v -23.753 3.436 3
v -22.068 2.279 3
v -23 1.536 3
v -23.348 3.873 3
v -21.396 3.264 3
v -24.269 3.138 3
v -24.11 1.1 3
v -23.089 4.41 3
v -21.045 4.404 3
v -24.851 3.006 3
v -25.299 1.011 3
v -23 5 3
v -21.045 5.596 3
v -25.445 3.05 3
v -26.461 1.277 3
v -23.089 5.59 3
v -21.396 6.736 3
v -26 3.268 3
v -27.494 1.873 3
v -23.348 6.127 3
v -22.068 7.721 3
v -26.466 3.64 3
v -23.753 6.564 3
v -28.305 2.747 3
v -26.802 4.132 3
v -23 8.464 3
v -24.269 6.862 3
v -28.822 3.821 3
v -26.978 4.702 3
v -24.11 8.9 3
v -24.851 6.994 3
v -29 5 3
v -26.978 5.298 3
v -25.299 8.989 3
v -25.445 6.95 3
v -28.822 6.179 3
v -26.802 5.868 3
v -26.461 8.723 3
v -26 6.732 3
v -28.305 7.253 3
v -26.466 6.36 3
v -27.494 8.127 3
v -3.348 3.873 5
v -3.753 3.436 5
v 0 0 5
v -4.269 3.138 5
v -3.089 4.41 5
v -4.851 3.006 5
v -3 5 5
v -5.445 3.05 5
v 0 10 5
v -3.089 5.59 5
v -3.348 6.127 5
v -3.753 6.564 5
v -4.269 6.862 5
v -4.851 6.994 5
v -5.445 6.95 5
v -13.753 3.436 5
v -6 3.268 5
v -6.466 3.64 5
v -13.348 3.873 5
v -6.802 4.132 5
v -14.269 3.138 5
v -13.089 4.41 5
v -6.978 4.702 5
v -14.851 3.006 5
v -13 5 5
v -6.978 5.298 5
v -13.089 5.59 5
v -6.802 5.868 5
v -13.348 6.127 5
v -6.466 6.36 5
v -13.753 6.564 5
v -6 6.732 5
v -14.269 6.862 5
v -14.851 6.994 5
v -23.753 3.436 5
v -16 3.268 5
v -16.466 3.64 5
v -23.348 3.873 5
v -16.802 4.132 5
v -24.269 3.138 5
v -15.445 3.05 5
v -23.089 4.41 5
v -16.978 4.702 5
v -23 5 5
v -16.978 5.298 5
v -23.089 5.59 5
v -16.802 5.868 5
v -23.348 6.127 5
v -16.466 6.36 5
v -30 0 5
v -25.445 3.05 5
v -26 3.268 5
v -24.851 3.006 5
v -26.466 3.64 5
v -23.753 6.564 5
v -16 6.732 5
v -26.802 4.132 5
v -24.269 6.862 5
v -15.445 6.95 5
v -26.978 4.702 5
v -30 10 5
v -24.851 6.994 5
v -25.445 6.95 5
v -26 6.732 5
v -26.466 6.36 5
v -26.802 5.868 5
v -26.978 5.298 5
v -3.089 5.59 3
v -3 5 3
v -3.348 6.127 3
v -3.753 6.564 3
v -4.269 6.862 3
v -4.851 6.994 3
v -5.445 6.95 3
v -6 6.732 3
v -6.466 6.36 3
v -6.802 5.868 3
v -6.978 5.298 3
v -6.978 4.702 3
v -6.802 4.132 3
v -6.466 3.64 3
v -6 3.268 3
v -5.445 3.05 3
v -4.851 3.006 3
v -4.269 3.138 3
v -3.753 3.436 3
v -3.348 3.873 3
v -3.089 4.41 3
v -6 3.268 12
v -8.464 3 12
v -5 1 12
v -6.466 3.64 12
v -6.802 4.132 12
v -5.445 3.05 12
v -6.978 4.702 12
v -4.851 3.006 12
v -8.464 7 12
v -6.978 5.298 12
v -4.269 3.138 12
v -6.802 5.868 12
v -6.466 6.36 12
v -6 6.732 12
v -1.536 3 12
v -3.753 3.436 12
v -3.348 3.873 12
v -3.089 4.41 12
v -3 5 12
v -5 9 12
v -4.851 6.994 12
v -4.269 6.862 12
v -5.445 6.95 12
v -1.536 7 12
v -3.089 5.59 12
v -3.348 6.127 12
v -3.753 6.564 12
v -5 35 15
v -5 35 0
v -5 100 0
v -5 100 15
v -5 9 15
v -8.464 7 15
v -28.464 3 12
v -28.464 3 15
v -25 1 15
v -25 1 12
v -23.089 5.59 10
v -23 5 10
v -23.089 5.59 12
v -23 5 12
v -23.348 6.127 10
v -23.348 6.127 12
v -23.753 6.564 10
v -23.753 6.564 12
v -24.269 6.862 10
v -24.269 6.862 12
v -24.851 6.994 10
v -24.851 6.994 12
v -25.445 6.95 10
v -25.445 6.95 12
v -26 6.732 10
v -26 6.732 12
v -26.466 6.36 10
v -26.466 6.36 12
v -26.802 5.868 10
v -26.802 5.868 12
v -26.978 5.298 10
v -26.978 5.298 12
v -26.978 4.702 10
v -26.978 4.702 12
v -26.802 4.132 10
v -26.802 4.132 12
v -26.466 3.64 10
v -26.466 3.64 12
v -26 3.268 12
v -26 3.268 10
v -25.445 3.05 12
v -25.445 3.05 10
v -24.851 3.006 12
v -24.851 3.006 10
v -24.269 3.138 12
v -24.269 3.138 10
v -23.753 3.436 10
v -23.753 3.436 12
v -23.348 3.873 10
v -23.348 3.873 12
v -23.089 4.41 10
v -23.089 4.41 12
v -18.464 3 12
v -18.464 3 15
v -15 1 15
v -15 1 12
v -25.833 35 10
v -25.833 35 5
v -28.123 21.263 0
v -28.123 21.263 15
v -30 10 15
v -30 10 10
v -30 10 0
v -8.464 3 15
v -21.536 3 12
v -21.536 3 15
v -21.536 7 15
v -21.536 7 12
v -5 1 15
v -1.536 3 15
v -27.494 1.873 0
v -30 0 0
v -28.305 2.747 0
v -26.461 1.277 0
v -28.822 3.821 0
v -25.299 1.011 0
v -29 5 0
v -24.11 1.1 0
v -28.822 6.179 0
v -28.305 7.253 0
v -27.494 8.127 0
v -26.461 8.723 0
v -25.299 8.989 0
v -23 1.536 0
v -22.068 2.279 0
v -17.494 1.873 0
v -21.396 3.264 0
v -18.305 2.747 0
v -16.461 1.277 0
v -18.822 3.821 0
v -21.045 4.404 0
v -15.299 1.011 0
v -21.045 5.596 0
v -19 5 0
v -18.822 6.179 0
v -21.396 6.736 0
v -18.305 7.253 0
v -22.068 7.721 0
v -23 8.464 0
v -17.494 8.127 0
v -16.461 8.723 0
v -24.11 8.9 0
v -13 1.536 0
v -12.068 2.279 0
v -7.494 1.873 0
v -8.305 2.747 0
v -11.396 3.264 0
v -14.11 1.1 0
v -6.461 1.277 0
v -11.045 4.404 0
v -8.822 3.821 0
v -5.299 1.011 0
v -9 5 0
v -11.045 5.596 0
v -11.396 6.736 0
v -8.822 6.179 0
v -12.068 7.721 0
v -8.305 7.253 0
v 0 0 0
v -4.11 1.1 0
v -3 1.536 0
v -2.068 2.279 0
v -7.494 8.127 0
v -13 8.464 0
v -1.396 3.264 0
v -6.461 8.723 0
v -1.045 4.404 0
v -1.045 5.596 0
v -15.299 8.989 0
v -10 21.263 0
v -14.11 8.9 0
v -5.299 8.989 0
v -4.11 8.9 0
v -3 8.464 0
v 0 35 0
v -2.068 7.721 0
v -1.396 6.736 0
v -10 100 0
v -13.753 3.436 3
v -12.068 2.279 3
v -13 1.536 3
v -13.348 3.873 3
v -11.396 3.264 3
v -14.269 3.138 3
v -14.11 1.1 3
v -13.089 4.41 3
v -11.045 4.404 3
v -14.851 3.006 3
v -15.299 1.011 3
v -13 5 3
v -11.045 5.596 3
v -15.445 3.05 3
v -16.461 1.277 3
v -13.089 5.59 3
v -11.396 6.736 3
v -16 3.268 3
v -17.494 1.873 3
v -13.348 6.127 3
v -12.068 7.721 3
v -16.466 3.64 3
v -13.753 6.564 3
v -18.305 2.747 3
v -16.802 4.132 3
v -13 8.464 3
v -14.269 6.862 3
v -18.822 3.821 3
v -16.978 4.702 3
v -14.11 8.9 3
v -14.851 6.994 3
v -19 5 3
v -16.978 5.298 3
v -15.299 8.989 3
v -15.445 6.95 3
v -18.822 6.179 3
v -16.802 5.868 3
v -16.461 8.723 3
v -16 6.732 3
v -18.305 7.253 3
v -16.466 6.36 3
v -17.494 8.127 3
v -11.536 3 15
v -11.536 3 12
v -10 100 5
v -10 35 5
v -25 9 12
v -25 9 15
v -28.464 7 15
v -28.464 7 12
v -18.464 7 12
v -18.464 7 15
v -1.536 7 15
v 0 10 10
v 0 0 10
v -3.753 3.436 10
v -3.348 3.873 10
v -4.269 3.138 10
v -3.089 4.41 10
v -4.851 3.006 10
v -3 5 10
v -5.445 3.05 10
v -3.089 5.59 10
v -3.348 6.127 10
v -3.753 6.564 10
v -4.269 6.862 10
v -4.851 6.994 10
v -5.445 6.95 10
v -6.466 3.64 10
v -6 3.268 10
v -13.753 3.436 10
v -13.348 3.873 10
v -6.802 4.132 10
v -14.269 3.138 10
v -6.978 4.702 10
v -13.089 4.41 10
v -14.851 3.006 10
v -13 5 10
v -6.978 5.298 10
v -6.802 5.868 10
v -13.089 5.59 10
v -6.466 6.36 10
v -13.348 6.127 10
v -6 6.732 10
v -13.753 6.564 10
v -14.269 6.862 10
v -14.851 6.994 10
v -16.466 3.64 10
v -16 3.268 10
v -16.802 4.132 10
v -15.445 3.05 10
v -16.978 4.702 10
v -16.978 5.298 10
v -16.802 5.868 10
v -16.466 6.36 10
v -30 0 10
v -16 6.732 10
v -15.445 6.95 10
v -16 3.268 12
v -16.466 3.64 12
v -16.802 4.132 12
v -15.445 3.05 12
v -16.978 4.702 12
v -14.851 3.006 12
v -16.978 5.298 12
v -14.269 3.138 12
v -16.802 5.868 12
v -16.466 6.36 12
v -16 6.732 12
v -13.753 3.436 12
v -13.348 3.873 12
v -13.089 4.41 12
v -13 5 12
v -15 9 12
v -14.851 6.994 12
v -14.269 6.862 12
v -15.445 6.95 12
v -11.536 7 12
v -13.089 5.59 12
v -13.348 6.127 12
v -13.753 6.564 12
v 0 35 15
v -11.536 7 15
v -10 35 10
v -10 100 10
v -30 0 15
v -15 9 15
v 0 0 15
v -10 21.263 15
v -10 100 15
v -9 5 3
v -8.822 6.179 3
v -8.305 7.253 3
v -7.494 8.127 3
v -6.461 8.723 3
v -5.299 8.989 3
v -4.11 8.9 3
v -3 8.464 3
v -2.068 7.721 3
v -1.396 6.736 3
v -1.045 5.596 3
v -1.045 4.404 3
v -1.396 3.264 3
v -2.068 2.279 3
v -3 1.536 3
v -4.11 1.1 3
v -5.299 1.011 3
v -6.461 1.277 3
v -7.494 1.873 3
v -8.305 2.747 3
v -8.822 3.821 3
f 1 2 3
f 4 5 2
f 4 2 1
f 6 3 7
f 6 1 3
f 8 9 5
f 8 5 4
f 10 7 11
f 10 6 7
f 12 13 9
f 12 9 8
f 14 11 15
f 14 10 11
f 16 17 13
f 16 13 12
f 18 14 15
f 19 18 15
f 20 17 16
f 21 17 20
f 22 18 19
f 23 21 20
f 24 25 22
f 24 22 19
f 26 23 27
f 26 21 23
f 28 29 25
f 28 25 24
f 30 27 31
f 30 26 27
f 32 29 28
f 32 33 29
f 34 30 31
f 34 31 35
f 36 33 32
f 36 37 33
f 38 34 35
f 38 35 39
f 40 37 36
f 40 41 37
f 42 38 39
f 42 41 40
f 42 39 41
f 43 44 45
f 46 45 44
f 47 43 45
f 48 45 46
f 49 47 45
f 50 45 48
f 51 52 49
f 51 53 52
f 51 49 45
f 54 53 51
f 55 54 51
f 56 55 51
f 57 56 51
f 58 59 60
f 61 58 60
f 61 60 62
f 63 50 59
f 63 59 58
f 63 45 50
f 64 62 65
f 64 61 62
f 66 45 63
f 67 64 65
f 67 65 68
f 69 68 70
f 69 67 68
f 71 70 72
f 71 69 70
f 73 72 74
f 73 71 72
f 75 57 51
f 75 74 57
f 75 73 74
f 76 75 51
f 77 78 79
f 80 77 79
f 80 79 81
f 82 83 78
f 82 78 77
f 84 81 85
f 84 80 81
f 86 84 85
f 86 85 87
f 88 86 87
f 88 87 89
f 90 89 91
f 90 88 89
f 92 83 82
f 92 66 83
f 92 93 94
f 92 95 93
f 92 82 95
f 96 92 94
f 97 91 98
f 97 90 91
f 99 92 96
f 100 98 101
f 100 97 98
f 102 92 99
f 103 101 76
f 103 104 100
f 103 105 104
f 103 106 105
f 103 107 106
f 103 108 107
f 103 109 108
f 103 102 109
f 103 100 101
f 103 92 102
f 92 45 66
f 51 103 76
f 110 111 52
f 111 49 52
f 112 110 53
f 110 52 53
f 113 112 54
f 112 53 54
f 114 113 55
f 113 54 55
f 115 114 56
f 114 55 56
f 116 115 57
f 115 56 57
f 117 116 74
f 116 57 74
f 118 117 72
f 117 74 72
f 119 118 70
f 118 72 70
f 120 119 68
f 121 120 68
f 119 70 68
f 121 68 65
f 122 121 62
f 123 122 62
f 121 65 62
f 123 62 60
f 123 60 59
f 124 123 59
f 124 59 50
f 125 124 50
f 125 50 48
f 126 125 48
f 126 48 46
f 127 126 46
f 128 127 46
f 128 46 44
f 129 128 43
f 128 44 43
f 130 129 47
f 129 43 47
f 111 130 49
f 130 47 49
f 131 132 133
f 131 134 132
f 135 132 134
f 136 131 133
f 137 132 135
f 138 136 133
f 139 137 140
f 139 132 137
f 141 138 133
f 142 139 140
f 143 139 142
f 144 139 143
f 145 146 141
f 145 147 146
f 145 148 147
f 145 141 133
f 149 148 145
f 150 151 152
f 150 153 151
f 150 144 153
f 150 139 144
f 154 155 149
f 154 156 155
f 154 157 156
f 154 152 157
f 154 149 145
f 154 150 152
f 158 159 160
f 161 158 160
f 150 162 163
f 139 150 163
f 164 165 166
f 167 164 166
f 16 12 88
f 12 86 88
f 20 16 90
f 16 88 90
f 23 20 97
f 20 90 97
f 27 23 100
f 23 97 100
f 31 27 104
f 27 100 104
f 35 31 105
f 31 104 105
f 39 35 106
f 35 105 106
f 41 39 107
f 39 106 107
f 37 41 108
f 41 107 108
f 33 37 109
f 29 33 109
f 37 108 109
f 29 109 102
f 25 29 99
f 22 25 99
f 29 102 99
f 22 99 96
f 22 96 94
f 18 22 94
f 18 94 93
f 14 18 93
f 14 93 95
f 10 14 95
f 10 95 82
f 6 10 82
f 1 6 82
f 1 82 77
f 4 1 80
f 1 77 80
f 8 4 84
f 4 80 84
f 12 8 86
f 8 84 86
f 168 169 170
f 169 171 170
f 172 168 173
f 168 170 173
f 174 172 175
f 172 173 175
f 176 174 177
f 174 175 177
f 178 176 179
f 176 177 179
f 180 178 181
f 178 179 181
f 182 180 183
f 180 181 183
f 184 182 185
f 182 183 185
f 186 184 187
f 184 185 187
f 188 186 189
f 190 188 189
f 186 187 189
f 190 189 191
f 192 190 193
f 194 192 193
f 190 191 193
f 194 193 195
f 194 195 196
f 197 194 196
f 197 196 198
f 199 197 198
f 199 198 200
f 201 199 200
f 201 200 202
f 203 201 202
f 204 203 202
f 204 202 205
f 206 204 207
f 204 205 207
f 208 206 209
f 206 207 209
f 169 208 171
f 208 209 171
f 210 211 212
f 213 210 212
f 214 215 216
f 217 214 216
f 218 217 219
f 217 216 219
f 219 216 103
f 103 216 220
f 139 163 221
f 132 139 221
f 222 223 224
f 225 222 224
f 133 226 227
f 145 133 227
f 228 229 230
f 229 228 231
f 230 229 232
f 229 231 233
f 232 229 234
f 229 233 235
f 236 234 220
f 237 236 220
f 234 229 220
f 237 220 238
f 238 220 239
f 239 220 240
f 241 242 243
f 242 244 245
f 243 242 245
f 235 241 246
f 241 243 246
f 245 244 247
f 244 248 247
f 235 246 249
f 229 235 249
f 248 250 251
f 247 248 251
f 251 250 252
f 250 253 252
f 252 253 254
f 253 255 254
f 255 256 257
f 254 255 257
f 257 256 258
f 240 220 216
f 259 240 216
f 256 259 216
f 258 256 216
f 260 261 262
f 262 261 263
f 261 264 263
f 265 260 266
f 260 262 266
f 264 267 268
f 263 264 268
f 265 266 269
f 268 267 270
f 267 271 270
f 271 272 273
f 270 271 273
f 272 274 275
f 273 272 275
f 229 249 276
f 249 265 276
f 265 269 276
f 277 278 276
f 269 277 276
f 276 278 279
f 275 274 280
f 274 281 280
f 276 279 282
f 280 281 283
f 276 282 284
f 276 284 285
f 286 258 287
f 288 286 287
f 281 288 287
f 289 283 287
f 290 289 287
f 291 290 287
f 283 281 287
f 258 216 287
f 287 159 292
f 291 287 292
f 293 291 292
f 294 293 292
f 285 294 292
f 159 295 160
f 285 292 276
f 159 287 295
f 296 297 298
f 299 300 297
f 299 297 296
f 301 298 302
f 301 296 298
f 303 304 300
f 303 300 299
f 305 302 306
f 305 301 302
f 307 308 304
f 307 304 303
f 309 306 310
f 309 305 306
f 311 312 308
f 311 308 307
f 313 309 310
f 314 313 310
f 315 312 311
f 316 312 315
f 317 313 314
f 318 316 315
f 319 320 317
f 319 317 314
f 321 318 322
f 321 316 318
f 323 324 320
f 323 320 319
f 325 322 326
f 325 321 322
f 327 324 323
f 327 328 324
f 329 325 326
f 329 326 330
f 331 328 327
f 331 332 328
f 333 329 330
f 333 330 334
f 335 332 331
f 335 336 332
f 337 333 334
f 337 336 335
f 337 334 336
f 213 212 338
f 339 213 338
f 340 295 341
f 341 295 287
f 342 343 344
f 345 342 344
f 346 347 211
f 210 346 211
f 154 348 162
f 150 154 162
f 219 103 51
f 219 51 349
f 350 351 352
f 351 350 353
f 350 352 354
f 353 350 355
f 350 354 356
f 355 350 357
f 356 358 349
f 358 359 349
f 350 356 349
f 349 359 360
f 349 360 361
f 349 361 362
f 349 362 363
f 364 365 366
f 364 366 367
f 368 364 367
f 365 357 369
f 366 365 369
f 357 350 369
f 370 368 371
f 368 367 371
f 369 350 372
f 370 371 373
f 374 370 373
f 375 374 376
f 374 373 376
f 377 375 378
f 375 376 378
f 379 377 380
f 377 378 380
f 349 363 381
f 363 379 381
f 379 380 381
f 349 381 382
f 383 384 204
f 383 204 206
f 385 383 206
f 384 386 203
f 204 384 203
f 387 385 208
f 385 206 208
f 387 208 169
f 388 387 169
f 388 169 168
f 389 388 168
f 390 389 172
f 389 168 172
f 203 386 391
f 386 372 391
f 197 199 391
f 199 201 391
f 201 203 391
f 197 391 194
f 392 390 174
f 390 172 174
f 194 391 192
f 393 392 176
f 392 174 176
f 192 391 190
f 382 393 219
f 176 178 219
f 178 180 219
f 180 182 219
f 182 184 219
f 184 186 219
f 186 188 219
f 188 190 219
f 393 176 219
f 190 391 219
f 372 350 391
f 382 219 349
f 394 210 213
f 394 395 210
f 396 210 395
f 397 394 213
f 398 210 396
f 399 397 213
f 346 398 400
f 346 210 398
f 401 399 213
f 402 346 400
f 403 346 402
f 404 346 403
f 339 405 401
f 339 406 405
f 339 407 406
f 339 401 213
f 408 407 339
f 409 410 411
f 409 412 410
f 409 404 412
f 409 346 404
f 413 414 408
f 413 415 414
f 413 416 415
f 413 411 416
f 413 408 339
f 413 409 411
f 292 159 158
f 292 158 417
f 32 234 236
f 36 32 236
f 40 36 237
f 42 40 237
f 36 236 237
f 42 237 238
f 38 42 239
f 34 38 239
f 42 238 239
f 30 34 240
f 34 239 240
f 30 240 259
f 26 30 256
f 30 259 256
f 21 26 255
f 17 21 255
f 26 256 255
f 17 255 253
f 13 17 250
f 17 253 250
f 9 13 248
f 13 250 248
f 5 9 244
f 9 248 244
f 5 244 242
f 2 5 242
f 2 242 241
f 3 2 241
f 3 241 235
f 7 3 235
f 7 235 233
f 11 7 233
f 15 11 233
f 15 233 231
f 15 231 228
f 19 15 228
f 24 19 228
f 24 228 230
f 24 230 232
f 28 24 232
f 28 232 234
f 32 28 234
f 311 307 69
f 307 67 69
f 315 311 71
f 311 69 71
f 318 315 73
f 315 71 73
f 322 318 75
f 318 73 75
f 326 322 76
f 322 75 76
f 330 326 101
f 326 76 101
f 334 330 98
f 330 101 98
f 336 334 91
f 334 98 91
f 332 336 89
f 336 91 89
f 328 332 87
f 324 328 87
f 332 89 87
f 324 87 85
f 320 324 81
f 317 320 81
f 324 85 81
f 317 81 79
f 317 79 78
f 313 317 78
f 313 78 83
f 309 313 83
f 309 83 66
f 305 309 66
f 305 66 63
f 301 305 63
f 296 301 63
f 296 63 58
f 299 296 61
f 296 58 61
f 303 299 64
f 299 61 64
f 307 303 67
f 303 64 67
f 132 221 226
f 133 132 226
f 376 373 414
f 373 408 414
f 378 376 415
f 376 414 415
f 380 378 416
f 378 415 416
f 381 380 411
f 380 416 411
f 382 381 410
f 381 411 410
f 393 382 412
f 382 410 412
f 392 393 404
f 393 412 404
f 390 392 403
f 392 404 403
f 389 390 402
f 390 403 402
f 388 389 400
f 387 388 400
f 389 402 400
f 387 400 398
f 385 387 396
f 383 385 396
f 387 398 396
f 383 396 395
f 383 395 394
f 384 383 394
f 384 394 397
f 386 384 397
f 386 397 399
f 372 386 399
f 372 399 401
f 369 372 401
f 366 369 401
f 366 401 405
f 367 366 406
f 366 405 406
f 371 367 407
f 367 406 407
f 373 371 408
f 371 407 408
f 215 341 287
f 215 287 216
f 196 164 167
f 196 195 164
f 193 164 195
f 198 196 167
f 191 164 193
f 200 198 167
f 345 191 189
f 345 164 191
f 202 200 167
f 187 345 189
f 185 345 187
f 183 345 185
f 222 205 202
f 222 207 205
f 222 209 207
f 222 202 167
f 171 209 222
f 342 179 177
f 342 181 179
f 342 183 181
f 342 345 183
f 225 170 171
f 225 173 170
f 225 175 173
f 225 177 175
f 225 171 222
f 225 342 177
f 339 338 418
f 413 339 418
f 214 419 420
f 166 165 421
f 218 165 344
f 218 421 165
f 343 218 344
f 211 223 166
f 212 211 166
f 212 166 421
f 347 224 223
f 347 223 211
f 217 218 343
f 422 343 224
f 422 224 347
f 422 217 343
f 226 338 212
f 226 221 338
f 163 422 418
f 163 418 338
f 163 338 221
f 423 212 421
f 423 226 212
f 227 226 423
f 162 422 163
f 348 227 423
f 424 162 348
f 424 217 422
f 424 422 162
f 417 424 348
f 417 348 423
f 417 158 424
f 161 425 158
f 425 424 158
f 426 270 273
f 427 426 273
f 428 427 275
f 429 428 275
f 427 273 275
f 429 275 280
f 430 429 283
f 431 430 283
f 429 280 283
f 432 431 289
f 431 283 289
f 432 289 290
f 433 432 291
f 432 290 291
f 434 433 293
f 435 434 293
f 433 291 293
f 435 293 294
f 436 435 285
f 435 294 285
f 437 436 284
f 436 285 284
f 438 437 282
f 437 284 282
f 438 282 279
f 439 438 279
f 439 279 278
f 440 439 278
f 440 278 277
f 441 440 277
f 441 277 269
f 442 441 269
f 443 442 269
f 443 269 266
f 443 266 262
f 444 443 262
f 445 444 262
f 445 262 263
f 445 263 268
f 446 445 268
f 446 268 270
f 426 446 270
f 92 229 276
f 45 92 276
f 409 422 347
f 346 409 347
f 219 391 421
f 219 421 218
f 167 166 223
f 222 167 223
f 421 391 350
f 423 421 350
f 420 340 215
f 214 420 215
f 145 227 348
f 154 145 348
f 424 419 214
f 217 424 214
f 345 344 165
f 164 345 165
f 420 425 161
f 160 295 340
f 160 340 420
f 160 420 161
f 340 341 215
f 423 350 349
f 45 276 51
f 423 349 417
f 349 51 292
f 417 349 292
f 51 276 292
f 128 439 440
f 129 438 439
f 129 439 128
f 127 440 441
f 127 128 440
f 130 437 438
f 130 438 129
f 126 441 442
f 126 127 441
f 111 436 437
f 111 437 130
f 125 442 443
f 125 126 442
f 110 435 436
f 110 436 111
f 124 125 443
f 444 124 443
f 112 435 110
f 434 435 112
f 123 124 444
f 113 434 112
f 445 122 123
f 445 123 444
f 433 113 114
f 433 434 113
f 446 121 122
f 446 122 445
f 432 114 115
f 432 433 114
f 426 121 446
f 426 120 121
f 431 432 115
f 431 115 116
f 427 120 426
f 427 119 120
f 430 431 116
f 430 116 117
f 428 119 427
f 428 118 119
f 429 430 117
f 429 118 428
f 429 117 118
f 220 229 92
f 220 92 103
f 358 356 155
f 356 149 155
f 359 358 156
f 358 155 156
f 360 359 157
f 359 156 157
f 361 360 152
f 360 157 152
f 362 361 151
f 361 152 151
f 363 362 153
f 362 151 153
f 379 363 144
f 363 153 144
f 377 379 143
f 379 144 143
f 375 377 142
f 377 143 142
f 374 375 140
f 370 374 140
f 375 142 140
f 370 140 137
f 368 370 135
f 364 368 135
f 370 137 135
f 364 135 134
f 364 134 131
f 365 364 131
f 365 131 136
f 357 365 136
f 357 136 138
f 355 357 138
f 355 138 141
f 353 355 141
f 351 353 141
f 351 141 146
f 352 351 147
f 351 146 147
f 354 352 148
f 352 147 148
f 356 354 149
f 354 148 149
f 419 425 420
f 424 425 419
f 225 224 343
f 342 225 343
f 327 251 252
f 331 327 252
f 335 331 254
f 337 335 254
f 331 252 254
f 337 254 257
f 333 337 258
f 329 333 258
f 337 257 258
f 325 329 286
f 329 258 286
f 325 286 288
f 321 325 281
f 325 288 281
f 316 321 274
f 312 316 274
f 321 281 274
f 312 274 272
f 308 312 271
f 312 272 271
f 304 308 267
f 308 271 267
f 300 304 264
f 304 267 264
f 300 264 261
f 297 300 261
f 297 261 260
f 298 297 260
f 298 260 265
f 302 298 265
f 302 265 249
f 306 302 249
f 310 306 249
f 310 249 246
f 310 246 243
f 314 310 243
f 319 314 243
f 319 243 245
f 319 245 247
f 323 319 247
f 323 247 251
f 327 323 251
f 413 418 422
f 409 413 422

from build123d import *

# Parameters (mm, degrees)
SKETCH1_W                                        = 10
SKETCH1_H                                        = 65
SKETCH1_H_2                                      = 25
SKETCH1_W_2                                      = 5
SKETCH1_H_3                                      = 10
SKETCH1_W_3                                      = 15
BOSS_EXTRUDE1_DEPTH                              = 15
CBORE_FOR_M4_HEX_HEAD_MACHINE_SCREW1_D           = 4
CBORE_FOR_M4_HEX_HEAD_MACHINE_SCREW1_CBORE_D     = 8
CBORE_FOR_M4_HEX_HEAD_MACHINE_SCREW1_CBORE_DEPTH = 3
CUT_EXTRUDE1_DEPTH                               = 3
SKETCH7_W                                        = 5
SKETCH7_H                                        = 10
CUT_EXTRUDE2_DEPTH                               = 106.475115549
CUT_EXTRUDE3_DEPTH                               = 106.475115549
CUT_EXTRUDE4_DEPTH                               = 5
CUT_EXTRUDE5_DEPTH                               = 5
CHAMFER1_SIZE2                                   = 5
CHAMFER1_SIZE                                    = 13.737387097
CHAMFER2_SIZE2                                   = 5
CHAMFER2_SIZE                                    = 13.737387097


with BuildPart() as part:
    # Sketch1 → Boss-Extrude1 (new body)
    with BuildSketch(Plane.XY):
        Polygon((-30, 10), (-15, 10), (-15, 35), (-15, 100), align=None)
        with Locations((-10, 67.5)):
            Rectangle(SKETCH1_W, SKETCH1_H)
        with Locations((-10, 22.5)):
            Rectangle(SKETCH1_W, SKETCH1_H_2)
        with Locations((-2.5, 22.5)):
            Rectangle(SKETCH1_W_2, SKETCH1_H_2)
        with Locations((-2.5, 5)):
            Rectangle(SKETCH1_W_2, SKETCH1_H_3)
        with Locations((-10, 5)):
            Rectangle(SKETCH1_W, SKETCH1_H_3)
        with Locations((-22.5, 5)):
            Rectangle(SKETCH1_W_3, SKETCH1_H_3)
    extrude(amount=BOSS_EXTRUDE1_DEPTH)

    # CBORE for M4 Hex Head Machine Screw1 (through all)
    with Locations(Plane(origin=(0, 0, 0), x_dir=(-1, 0, 0), z_dir=(0, 0, -1))):
        with Locations((25, 5), (15, 5), (5, 5)):
            CounterBoreHole(CBORE_FOR_M4_HEX_HEAD_MACHINE_SCREW1_D / 2, CBORE_FOR_M4_HEX_HEAD_MACHINE_SCREW1_CBORE_D / 2, CBORE_FOR_M4_HEX_HEAD_MACHINE_SCREW1_CBORE_DEPTH)

    # Sketch6 → Cut-Extrude1 (cut)
    with BuildSketch(Plane.XY.offset(15)):
        Polygon((-15, 9), (-18.464101615, 7), (-18.464101615, 3), (-15, 1), (-11.535898385, 3), (-11.535898385, 7), align=None)
        Polygon((-25, 9), (-28.464101615, 7), (-28.464101615, 3), (-25, 1), (-21.535898385, 3), (-21.535898385, 7), align=None)
        Polygon((-5, 9), (-8.464101615, 7), (-8.464101615, 3), (-5, 1), (-1.535898385, 3), (-1.535898385, 7), align=None)
    extrude(amount=-CUT_EXTRUDE1_DEPTH, mode=Mode.SUBTRACT)

    # Sketch7 → Cut-Extrude2 (cut, through all)
    with BuildSketch(Plane.ZY.offset(30)):
        with Locations((7.5, 5)):
            Rectangle(SKETCH7_W, SKETCH7_H)
    extrude(amount=-CUT_EXTRUDE2_DEPTH, mode=Mode.SUBTRACT)

    # Sketch8 → Cut-Extrude3 (cut, through all)
    with BuildSketch(Plane(origin=(0, 0, 0), x_dir=(-1, 0, 0), z_dir=(0, 0, -1))):
        Polygon((15, 100), (10, 100), (25.833333333, 35), align=None)
    extrude(amount=-CUT_EXTRUDE3_DEPTH, mode=Mode.SUBTRACT)

    # Sketch9 → Cut-Extrude4 (cut)
    with BuildSketch(Plane(origin=(0, 0, 0), x_dir=(-1, 0, 0), z_dir=(0, 0, -1))):
        Polygon((10, 100), (10, 35), (25.833333333, 35), align=None)
    extrude(amount=-CUT_EXTRUDE4_DEPTH, mode=Mode.SUBTRACT)

    # Sketch10 → Cut-Extrude5 (cut)
    with BuildSketch(Plane.XY.offset(15)):
        Polygon((-10, 100), (-10, 35), (-25.833333333, 35), align=None)
    extrude(amount=-CUT_EXTRUDE5_DEPTH, mode=Mode.SUBTRACT)

    # Chamfer1
    chamfer1_edges = [part.edges().sort_by_distance(p)[0] for p in [
        (-17.916666667, 35, 15),
    ]]
    chamfer1_side = [part.faces().sort_by_distance(p)[0] for p in [
        (-17.916666667, 34.9, 15),
    ]]
    chamfer(chamfer1_edges, length=CHAMFER1_SIZE - 0.0001, length2=CHAMFER1_SIZE2 - 0.0001, reference=chamfer1_side[0])  # a hair under: the kernel refuses the full size

    # Chamfer2
    chamfer2_edges = [part.edges().sort_by_distance(p)[0] for p in [
        (-17.916666667, 35, 0),
    ]]
    chamfer2_side = [part.faces().sort_by_distance(p)[0] for p in [
        (-17.916666667, 34.9, 0),
    ]]
    chamfer(chamfer2_edges, length=CHAMFER2_SIZE - 0.0001, length2=CHAMFER2_SIZE2 - 0.0001, reference=chamfer2_side[0])  # a hair under: the kernel refuses the full size


solid = part.part
